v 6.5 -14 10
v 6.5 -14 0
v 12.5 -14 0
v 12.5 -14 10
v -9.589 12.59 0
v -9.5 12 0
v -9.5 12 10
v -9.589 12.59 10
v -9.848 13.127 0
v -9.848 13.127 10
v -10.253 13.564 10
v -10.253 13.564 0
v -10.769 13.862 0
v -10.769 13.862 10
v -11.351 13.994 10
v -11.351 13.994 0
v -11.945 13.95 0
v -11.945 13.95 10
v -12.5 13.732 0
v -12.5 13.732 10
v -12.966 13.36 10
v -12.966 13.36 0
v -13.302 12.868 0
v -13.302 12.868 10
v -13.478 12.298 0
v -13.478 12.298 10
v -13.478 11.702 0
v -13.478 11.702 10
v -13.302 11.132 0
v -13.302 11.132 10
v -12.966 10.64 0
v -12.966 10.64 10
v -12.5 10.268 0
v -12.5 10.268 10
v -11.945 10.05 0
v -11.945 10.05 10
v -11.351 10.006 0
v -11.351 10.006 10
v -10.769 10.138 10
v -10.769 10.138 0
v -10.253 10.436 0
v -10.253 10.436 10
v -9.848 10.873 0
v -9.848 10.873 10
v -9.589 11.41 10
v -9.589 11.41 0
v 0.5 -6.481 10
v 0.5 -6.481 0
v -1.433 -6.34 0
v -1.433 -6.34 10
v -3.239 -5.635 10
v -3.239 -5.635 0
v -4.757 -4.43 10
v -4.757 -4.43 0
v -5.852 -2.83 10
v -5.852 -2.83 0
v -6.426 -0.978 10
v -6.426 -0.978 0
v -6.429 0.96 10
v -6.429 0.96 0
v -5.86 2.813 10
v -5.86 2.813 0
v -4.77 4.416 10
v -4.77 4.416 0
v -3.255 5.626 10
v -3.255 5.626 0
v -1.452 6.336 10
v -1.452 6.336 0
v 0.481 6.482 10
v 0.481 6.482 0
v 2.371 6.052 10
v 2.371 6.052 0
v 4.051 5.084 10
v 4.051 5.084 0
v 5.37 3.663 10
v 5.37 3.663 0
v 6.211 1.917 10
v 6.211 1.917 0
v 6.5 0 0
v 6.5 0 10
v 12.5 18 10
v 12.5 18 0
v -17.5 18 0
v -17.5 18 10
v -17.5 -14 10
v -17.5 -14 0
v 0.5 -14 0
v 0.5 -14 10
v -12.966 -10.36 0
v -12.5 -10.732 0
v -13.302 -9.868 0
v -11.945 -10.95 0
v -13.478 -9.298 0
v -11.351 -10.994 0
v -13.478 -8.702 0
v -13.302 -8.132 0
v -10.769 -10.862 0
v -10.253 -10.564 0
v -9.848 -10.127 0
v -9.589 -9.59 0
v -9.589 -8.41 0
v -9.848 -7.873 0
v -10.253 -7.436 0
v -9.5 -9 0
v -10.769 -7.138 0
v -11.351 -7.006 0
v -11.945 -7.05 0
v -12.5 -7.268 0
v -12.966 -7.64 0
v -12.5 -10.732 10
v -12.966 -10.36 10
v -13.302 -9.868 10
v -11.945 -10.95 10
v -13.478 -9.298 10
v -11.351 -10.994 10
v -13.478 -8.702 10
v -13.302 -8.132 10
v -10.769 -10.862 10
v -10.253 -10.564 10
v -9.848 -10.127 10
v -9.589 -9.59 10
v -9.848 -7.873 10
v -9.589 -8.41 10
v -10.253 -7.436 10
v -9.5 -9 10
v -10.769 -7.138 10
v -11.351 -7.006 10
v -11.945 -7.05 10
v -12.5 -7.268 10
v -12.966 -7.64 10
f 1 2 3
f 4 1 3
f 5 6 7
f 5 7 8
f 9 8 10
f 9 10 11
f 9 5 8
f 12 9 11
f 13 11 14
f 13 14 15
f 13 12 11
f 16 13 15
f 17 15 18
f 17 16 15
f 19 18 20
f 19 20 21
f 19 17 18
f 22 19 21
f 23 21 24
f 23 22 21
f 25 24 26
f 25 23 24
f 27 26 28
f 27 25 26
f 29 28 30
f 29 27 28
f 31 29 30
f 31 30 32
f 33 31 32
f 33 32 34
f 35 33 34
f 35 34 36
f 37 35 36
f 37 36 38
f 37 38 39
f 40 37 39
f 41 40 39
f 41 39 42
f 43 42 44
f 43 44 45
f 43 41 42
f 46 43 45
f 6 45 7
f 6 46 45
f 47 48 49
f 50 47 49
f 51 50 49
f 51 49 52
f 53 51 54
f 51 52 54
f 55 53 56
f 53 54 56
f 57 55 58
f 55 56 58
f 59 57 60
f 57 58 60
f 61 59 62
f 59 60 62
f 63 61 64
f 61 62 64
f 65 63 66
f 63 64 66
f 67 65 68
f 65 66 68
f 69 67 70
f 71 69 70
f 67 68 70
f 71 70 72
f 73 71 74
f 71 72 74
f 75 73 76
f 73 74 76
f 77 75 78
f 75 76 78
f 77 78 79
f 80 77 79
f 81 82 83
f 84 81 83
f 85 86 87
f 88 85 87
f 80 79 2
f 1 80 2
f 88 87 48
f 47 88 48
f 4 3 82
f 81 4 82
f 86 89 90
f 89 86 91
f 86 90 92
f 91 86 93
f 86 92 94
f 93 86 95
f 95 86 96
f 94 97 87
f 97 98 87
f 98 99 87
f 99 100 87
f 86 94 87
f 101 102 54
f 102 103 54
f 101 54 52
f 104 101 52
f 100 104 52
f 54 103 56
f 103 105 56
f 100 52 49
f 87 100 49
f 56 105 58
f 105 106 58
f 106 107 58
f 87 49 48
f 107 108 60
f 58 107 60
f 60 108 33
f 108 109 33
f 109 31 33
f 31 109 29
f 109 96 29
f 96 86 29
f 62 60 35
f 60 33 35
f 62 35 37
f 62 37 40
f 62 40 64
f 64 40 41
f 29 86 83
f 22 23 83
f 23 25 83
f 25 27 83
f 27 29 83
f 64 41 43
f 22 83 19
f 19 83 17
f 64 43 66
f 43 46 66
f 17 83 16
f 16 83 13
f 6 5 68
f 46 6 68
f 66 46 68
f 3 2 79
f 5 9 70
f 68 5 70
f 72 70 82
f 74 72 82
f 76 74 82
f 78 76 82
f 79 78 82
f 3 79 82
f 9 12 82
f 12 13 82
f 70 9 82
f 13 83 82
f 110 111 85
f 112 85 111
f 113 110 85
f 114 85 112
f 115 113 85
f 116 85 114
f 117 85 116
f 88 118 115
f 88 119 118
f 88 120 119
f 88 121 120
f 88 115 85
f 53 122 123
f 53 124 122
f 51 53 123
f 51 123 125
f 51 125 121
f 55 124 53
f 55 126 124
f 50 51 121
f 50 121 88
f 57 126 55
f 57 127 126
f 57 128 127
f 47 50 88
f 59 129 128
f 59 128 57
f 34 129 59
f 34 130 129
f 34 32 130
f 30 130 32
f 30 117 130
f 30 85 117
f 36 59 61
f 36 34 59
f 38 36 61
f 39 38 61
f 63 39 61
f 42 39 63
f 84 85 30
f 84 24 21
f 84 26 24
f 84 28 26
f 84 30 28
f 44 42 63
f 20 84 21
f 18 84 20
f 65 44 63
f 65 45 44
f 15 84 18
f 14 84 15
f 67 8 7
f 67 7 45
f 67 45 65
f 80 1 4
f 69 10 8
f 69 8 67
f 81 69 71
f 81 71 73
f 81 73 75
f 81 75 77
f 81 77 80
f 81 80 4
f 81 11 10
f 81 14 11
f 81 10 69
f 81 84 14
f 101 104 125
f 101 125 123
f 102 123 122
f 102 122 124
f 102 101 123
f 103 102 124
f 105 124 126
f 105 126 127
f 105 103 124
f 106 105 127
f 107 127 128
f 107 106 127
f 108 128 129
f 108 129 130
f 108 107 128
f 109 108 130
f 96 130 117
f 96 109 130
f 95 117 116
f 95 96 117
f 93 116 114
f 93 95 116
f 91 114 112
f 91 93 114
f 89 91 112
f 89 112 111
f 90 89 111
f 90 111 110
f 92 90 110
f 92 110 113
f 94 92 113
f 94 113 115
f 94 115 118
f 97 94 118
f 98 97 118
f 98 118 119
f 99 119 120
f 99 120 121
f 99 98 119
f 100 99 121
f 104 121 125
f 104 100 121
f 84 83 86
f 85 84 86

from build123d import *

# Parameters (mm, degrees)
SKETCH_2_R      = 2
EXTRUDE_1_DEPTH = 10


with BuildPart() as part:
    # Эскиз2 → Бобышка-Вытянуть1 (new body)
    with BuildSketch(Plane.XY):
        with BuildLine():
            Line((6.5, 0), (6.5, -14))
            Line((6.5, -14), (12.5, -14))
            Line((12.5, -14), (12.5, 18))
            Line((12.5, 18), (-17.5, 18))
            Line((-17.5, 18), (-17.5, -14))
            Line((-17.5, -14), (0.5, -14))
            Line((0.5, -14), (0.5, -6.480740698))
            ThreePointArc((0.5, -6.480740698), (-4.769696007, 4.415880433), (6.5, 0))
        make_face()
        with Locations((-11.5, 12)):
            Circle(SKETCH_2_R, mode=Mode.SUBTRACT)
        with Locations((-11.5, -9)):
            Circle(SKETCH_2_R, mode=Mode.SUBTRACT)
    extrude(amount=EXTRUDE_1_DEPTH)


solid = part.part
